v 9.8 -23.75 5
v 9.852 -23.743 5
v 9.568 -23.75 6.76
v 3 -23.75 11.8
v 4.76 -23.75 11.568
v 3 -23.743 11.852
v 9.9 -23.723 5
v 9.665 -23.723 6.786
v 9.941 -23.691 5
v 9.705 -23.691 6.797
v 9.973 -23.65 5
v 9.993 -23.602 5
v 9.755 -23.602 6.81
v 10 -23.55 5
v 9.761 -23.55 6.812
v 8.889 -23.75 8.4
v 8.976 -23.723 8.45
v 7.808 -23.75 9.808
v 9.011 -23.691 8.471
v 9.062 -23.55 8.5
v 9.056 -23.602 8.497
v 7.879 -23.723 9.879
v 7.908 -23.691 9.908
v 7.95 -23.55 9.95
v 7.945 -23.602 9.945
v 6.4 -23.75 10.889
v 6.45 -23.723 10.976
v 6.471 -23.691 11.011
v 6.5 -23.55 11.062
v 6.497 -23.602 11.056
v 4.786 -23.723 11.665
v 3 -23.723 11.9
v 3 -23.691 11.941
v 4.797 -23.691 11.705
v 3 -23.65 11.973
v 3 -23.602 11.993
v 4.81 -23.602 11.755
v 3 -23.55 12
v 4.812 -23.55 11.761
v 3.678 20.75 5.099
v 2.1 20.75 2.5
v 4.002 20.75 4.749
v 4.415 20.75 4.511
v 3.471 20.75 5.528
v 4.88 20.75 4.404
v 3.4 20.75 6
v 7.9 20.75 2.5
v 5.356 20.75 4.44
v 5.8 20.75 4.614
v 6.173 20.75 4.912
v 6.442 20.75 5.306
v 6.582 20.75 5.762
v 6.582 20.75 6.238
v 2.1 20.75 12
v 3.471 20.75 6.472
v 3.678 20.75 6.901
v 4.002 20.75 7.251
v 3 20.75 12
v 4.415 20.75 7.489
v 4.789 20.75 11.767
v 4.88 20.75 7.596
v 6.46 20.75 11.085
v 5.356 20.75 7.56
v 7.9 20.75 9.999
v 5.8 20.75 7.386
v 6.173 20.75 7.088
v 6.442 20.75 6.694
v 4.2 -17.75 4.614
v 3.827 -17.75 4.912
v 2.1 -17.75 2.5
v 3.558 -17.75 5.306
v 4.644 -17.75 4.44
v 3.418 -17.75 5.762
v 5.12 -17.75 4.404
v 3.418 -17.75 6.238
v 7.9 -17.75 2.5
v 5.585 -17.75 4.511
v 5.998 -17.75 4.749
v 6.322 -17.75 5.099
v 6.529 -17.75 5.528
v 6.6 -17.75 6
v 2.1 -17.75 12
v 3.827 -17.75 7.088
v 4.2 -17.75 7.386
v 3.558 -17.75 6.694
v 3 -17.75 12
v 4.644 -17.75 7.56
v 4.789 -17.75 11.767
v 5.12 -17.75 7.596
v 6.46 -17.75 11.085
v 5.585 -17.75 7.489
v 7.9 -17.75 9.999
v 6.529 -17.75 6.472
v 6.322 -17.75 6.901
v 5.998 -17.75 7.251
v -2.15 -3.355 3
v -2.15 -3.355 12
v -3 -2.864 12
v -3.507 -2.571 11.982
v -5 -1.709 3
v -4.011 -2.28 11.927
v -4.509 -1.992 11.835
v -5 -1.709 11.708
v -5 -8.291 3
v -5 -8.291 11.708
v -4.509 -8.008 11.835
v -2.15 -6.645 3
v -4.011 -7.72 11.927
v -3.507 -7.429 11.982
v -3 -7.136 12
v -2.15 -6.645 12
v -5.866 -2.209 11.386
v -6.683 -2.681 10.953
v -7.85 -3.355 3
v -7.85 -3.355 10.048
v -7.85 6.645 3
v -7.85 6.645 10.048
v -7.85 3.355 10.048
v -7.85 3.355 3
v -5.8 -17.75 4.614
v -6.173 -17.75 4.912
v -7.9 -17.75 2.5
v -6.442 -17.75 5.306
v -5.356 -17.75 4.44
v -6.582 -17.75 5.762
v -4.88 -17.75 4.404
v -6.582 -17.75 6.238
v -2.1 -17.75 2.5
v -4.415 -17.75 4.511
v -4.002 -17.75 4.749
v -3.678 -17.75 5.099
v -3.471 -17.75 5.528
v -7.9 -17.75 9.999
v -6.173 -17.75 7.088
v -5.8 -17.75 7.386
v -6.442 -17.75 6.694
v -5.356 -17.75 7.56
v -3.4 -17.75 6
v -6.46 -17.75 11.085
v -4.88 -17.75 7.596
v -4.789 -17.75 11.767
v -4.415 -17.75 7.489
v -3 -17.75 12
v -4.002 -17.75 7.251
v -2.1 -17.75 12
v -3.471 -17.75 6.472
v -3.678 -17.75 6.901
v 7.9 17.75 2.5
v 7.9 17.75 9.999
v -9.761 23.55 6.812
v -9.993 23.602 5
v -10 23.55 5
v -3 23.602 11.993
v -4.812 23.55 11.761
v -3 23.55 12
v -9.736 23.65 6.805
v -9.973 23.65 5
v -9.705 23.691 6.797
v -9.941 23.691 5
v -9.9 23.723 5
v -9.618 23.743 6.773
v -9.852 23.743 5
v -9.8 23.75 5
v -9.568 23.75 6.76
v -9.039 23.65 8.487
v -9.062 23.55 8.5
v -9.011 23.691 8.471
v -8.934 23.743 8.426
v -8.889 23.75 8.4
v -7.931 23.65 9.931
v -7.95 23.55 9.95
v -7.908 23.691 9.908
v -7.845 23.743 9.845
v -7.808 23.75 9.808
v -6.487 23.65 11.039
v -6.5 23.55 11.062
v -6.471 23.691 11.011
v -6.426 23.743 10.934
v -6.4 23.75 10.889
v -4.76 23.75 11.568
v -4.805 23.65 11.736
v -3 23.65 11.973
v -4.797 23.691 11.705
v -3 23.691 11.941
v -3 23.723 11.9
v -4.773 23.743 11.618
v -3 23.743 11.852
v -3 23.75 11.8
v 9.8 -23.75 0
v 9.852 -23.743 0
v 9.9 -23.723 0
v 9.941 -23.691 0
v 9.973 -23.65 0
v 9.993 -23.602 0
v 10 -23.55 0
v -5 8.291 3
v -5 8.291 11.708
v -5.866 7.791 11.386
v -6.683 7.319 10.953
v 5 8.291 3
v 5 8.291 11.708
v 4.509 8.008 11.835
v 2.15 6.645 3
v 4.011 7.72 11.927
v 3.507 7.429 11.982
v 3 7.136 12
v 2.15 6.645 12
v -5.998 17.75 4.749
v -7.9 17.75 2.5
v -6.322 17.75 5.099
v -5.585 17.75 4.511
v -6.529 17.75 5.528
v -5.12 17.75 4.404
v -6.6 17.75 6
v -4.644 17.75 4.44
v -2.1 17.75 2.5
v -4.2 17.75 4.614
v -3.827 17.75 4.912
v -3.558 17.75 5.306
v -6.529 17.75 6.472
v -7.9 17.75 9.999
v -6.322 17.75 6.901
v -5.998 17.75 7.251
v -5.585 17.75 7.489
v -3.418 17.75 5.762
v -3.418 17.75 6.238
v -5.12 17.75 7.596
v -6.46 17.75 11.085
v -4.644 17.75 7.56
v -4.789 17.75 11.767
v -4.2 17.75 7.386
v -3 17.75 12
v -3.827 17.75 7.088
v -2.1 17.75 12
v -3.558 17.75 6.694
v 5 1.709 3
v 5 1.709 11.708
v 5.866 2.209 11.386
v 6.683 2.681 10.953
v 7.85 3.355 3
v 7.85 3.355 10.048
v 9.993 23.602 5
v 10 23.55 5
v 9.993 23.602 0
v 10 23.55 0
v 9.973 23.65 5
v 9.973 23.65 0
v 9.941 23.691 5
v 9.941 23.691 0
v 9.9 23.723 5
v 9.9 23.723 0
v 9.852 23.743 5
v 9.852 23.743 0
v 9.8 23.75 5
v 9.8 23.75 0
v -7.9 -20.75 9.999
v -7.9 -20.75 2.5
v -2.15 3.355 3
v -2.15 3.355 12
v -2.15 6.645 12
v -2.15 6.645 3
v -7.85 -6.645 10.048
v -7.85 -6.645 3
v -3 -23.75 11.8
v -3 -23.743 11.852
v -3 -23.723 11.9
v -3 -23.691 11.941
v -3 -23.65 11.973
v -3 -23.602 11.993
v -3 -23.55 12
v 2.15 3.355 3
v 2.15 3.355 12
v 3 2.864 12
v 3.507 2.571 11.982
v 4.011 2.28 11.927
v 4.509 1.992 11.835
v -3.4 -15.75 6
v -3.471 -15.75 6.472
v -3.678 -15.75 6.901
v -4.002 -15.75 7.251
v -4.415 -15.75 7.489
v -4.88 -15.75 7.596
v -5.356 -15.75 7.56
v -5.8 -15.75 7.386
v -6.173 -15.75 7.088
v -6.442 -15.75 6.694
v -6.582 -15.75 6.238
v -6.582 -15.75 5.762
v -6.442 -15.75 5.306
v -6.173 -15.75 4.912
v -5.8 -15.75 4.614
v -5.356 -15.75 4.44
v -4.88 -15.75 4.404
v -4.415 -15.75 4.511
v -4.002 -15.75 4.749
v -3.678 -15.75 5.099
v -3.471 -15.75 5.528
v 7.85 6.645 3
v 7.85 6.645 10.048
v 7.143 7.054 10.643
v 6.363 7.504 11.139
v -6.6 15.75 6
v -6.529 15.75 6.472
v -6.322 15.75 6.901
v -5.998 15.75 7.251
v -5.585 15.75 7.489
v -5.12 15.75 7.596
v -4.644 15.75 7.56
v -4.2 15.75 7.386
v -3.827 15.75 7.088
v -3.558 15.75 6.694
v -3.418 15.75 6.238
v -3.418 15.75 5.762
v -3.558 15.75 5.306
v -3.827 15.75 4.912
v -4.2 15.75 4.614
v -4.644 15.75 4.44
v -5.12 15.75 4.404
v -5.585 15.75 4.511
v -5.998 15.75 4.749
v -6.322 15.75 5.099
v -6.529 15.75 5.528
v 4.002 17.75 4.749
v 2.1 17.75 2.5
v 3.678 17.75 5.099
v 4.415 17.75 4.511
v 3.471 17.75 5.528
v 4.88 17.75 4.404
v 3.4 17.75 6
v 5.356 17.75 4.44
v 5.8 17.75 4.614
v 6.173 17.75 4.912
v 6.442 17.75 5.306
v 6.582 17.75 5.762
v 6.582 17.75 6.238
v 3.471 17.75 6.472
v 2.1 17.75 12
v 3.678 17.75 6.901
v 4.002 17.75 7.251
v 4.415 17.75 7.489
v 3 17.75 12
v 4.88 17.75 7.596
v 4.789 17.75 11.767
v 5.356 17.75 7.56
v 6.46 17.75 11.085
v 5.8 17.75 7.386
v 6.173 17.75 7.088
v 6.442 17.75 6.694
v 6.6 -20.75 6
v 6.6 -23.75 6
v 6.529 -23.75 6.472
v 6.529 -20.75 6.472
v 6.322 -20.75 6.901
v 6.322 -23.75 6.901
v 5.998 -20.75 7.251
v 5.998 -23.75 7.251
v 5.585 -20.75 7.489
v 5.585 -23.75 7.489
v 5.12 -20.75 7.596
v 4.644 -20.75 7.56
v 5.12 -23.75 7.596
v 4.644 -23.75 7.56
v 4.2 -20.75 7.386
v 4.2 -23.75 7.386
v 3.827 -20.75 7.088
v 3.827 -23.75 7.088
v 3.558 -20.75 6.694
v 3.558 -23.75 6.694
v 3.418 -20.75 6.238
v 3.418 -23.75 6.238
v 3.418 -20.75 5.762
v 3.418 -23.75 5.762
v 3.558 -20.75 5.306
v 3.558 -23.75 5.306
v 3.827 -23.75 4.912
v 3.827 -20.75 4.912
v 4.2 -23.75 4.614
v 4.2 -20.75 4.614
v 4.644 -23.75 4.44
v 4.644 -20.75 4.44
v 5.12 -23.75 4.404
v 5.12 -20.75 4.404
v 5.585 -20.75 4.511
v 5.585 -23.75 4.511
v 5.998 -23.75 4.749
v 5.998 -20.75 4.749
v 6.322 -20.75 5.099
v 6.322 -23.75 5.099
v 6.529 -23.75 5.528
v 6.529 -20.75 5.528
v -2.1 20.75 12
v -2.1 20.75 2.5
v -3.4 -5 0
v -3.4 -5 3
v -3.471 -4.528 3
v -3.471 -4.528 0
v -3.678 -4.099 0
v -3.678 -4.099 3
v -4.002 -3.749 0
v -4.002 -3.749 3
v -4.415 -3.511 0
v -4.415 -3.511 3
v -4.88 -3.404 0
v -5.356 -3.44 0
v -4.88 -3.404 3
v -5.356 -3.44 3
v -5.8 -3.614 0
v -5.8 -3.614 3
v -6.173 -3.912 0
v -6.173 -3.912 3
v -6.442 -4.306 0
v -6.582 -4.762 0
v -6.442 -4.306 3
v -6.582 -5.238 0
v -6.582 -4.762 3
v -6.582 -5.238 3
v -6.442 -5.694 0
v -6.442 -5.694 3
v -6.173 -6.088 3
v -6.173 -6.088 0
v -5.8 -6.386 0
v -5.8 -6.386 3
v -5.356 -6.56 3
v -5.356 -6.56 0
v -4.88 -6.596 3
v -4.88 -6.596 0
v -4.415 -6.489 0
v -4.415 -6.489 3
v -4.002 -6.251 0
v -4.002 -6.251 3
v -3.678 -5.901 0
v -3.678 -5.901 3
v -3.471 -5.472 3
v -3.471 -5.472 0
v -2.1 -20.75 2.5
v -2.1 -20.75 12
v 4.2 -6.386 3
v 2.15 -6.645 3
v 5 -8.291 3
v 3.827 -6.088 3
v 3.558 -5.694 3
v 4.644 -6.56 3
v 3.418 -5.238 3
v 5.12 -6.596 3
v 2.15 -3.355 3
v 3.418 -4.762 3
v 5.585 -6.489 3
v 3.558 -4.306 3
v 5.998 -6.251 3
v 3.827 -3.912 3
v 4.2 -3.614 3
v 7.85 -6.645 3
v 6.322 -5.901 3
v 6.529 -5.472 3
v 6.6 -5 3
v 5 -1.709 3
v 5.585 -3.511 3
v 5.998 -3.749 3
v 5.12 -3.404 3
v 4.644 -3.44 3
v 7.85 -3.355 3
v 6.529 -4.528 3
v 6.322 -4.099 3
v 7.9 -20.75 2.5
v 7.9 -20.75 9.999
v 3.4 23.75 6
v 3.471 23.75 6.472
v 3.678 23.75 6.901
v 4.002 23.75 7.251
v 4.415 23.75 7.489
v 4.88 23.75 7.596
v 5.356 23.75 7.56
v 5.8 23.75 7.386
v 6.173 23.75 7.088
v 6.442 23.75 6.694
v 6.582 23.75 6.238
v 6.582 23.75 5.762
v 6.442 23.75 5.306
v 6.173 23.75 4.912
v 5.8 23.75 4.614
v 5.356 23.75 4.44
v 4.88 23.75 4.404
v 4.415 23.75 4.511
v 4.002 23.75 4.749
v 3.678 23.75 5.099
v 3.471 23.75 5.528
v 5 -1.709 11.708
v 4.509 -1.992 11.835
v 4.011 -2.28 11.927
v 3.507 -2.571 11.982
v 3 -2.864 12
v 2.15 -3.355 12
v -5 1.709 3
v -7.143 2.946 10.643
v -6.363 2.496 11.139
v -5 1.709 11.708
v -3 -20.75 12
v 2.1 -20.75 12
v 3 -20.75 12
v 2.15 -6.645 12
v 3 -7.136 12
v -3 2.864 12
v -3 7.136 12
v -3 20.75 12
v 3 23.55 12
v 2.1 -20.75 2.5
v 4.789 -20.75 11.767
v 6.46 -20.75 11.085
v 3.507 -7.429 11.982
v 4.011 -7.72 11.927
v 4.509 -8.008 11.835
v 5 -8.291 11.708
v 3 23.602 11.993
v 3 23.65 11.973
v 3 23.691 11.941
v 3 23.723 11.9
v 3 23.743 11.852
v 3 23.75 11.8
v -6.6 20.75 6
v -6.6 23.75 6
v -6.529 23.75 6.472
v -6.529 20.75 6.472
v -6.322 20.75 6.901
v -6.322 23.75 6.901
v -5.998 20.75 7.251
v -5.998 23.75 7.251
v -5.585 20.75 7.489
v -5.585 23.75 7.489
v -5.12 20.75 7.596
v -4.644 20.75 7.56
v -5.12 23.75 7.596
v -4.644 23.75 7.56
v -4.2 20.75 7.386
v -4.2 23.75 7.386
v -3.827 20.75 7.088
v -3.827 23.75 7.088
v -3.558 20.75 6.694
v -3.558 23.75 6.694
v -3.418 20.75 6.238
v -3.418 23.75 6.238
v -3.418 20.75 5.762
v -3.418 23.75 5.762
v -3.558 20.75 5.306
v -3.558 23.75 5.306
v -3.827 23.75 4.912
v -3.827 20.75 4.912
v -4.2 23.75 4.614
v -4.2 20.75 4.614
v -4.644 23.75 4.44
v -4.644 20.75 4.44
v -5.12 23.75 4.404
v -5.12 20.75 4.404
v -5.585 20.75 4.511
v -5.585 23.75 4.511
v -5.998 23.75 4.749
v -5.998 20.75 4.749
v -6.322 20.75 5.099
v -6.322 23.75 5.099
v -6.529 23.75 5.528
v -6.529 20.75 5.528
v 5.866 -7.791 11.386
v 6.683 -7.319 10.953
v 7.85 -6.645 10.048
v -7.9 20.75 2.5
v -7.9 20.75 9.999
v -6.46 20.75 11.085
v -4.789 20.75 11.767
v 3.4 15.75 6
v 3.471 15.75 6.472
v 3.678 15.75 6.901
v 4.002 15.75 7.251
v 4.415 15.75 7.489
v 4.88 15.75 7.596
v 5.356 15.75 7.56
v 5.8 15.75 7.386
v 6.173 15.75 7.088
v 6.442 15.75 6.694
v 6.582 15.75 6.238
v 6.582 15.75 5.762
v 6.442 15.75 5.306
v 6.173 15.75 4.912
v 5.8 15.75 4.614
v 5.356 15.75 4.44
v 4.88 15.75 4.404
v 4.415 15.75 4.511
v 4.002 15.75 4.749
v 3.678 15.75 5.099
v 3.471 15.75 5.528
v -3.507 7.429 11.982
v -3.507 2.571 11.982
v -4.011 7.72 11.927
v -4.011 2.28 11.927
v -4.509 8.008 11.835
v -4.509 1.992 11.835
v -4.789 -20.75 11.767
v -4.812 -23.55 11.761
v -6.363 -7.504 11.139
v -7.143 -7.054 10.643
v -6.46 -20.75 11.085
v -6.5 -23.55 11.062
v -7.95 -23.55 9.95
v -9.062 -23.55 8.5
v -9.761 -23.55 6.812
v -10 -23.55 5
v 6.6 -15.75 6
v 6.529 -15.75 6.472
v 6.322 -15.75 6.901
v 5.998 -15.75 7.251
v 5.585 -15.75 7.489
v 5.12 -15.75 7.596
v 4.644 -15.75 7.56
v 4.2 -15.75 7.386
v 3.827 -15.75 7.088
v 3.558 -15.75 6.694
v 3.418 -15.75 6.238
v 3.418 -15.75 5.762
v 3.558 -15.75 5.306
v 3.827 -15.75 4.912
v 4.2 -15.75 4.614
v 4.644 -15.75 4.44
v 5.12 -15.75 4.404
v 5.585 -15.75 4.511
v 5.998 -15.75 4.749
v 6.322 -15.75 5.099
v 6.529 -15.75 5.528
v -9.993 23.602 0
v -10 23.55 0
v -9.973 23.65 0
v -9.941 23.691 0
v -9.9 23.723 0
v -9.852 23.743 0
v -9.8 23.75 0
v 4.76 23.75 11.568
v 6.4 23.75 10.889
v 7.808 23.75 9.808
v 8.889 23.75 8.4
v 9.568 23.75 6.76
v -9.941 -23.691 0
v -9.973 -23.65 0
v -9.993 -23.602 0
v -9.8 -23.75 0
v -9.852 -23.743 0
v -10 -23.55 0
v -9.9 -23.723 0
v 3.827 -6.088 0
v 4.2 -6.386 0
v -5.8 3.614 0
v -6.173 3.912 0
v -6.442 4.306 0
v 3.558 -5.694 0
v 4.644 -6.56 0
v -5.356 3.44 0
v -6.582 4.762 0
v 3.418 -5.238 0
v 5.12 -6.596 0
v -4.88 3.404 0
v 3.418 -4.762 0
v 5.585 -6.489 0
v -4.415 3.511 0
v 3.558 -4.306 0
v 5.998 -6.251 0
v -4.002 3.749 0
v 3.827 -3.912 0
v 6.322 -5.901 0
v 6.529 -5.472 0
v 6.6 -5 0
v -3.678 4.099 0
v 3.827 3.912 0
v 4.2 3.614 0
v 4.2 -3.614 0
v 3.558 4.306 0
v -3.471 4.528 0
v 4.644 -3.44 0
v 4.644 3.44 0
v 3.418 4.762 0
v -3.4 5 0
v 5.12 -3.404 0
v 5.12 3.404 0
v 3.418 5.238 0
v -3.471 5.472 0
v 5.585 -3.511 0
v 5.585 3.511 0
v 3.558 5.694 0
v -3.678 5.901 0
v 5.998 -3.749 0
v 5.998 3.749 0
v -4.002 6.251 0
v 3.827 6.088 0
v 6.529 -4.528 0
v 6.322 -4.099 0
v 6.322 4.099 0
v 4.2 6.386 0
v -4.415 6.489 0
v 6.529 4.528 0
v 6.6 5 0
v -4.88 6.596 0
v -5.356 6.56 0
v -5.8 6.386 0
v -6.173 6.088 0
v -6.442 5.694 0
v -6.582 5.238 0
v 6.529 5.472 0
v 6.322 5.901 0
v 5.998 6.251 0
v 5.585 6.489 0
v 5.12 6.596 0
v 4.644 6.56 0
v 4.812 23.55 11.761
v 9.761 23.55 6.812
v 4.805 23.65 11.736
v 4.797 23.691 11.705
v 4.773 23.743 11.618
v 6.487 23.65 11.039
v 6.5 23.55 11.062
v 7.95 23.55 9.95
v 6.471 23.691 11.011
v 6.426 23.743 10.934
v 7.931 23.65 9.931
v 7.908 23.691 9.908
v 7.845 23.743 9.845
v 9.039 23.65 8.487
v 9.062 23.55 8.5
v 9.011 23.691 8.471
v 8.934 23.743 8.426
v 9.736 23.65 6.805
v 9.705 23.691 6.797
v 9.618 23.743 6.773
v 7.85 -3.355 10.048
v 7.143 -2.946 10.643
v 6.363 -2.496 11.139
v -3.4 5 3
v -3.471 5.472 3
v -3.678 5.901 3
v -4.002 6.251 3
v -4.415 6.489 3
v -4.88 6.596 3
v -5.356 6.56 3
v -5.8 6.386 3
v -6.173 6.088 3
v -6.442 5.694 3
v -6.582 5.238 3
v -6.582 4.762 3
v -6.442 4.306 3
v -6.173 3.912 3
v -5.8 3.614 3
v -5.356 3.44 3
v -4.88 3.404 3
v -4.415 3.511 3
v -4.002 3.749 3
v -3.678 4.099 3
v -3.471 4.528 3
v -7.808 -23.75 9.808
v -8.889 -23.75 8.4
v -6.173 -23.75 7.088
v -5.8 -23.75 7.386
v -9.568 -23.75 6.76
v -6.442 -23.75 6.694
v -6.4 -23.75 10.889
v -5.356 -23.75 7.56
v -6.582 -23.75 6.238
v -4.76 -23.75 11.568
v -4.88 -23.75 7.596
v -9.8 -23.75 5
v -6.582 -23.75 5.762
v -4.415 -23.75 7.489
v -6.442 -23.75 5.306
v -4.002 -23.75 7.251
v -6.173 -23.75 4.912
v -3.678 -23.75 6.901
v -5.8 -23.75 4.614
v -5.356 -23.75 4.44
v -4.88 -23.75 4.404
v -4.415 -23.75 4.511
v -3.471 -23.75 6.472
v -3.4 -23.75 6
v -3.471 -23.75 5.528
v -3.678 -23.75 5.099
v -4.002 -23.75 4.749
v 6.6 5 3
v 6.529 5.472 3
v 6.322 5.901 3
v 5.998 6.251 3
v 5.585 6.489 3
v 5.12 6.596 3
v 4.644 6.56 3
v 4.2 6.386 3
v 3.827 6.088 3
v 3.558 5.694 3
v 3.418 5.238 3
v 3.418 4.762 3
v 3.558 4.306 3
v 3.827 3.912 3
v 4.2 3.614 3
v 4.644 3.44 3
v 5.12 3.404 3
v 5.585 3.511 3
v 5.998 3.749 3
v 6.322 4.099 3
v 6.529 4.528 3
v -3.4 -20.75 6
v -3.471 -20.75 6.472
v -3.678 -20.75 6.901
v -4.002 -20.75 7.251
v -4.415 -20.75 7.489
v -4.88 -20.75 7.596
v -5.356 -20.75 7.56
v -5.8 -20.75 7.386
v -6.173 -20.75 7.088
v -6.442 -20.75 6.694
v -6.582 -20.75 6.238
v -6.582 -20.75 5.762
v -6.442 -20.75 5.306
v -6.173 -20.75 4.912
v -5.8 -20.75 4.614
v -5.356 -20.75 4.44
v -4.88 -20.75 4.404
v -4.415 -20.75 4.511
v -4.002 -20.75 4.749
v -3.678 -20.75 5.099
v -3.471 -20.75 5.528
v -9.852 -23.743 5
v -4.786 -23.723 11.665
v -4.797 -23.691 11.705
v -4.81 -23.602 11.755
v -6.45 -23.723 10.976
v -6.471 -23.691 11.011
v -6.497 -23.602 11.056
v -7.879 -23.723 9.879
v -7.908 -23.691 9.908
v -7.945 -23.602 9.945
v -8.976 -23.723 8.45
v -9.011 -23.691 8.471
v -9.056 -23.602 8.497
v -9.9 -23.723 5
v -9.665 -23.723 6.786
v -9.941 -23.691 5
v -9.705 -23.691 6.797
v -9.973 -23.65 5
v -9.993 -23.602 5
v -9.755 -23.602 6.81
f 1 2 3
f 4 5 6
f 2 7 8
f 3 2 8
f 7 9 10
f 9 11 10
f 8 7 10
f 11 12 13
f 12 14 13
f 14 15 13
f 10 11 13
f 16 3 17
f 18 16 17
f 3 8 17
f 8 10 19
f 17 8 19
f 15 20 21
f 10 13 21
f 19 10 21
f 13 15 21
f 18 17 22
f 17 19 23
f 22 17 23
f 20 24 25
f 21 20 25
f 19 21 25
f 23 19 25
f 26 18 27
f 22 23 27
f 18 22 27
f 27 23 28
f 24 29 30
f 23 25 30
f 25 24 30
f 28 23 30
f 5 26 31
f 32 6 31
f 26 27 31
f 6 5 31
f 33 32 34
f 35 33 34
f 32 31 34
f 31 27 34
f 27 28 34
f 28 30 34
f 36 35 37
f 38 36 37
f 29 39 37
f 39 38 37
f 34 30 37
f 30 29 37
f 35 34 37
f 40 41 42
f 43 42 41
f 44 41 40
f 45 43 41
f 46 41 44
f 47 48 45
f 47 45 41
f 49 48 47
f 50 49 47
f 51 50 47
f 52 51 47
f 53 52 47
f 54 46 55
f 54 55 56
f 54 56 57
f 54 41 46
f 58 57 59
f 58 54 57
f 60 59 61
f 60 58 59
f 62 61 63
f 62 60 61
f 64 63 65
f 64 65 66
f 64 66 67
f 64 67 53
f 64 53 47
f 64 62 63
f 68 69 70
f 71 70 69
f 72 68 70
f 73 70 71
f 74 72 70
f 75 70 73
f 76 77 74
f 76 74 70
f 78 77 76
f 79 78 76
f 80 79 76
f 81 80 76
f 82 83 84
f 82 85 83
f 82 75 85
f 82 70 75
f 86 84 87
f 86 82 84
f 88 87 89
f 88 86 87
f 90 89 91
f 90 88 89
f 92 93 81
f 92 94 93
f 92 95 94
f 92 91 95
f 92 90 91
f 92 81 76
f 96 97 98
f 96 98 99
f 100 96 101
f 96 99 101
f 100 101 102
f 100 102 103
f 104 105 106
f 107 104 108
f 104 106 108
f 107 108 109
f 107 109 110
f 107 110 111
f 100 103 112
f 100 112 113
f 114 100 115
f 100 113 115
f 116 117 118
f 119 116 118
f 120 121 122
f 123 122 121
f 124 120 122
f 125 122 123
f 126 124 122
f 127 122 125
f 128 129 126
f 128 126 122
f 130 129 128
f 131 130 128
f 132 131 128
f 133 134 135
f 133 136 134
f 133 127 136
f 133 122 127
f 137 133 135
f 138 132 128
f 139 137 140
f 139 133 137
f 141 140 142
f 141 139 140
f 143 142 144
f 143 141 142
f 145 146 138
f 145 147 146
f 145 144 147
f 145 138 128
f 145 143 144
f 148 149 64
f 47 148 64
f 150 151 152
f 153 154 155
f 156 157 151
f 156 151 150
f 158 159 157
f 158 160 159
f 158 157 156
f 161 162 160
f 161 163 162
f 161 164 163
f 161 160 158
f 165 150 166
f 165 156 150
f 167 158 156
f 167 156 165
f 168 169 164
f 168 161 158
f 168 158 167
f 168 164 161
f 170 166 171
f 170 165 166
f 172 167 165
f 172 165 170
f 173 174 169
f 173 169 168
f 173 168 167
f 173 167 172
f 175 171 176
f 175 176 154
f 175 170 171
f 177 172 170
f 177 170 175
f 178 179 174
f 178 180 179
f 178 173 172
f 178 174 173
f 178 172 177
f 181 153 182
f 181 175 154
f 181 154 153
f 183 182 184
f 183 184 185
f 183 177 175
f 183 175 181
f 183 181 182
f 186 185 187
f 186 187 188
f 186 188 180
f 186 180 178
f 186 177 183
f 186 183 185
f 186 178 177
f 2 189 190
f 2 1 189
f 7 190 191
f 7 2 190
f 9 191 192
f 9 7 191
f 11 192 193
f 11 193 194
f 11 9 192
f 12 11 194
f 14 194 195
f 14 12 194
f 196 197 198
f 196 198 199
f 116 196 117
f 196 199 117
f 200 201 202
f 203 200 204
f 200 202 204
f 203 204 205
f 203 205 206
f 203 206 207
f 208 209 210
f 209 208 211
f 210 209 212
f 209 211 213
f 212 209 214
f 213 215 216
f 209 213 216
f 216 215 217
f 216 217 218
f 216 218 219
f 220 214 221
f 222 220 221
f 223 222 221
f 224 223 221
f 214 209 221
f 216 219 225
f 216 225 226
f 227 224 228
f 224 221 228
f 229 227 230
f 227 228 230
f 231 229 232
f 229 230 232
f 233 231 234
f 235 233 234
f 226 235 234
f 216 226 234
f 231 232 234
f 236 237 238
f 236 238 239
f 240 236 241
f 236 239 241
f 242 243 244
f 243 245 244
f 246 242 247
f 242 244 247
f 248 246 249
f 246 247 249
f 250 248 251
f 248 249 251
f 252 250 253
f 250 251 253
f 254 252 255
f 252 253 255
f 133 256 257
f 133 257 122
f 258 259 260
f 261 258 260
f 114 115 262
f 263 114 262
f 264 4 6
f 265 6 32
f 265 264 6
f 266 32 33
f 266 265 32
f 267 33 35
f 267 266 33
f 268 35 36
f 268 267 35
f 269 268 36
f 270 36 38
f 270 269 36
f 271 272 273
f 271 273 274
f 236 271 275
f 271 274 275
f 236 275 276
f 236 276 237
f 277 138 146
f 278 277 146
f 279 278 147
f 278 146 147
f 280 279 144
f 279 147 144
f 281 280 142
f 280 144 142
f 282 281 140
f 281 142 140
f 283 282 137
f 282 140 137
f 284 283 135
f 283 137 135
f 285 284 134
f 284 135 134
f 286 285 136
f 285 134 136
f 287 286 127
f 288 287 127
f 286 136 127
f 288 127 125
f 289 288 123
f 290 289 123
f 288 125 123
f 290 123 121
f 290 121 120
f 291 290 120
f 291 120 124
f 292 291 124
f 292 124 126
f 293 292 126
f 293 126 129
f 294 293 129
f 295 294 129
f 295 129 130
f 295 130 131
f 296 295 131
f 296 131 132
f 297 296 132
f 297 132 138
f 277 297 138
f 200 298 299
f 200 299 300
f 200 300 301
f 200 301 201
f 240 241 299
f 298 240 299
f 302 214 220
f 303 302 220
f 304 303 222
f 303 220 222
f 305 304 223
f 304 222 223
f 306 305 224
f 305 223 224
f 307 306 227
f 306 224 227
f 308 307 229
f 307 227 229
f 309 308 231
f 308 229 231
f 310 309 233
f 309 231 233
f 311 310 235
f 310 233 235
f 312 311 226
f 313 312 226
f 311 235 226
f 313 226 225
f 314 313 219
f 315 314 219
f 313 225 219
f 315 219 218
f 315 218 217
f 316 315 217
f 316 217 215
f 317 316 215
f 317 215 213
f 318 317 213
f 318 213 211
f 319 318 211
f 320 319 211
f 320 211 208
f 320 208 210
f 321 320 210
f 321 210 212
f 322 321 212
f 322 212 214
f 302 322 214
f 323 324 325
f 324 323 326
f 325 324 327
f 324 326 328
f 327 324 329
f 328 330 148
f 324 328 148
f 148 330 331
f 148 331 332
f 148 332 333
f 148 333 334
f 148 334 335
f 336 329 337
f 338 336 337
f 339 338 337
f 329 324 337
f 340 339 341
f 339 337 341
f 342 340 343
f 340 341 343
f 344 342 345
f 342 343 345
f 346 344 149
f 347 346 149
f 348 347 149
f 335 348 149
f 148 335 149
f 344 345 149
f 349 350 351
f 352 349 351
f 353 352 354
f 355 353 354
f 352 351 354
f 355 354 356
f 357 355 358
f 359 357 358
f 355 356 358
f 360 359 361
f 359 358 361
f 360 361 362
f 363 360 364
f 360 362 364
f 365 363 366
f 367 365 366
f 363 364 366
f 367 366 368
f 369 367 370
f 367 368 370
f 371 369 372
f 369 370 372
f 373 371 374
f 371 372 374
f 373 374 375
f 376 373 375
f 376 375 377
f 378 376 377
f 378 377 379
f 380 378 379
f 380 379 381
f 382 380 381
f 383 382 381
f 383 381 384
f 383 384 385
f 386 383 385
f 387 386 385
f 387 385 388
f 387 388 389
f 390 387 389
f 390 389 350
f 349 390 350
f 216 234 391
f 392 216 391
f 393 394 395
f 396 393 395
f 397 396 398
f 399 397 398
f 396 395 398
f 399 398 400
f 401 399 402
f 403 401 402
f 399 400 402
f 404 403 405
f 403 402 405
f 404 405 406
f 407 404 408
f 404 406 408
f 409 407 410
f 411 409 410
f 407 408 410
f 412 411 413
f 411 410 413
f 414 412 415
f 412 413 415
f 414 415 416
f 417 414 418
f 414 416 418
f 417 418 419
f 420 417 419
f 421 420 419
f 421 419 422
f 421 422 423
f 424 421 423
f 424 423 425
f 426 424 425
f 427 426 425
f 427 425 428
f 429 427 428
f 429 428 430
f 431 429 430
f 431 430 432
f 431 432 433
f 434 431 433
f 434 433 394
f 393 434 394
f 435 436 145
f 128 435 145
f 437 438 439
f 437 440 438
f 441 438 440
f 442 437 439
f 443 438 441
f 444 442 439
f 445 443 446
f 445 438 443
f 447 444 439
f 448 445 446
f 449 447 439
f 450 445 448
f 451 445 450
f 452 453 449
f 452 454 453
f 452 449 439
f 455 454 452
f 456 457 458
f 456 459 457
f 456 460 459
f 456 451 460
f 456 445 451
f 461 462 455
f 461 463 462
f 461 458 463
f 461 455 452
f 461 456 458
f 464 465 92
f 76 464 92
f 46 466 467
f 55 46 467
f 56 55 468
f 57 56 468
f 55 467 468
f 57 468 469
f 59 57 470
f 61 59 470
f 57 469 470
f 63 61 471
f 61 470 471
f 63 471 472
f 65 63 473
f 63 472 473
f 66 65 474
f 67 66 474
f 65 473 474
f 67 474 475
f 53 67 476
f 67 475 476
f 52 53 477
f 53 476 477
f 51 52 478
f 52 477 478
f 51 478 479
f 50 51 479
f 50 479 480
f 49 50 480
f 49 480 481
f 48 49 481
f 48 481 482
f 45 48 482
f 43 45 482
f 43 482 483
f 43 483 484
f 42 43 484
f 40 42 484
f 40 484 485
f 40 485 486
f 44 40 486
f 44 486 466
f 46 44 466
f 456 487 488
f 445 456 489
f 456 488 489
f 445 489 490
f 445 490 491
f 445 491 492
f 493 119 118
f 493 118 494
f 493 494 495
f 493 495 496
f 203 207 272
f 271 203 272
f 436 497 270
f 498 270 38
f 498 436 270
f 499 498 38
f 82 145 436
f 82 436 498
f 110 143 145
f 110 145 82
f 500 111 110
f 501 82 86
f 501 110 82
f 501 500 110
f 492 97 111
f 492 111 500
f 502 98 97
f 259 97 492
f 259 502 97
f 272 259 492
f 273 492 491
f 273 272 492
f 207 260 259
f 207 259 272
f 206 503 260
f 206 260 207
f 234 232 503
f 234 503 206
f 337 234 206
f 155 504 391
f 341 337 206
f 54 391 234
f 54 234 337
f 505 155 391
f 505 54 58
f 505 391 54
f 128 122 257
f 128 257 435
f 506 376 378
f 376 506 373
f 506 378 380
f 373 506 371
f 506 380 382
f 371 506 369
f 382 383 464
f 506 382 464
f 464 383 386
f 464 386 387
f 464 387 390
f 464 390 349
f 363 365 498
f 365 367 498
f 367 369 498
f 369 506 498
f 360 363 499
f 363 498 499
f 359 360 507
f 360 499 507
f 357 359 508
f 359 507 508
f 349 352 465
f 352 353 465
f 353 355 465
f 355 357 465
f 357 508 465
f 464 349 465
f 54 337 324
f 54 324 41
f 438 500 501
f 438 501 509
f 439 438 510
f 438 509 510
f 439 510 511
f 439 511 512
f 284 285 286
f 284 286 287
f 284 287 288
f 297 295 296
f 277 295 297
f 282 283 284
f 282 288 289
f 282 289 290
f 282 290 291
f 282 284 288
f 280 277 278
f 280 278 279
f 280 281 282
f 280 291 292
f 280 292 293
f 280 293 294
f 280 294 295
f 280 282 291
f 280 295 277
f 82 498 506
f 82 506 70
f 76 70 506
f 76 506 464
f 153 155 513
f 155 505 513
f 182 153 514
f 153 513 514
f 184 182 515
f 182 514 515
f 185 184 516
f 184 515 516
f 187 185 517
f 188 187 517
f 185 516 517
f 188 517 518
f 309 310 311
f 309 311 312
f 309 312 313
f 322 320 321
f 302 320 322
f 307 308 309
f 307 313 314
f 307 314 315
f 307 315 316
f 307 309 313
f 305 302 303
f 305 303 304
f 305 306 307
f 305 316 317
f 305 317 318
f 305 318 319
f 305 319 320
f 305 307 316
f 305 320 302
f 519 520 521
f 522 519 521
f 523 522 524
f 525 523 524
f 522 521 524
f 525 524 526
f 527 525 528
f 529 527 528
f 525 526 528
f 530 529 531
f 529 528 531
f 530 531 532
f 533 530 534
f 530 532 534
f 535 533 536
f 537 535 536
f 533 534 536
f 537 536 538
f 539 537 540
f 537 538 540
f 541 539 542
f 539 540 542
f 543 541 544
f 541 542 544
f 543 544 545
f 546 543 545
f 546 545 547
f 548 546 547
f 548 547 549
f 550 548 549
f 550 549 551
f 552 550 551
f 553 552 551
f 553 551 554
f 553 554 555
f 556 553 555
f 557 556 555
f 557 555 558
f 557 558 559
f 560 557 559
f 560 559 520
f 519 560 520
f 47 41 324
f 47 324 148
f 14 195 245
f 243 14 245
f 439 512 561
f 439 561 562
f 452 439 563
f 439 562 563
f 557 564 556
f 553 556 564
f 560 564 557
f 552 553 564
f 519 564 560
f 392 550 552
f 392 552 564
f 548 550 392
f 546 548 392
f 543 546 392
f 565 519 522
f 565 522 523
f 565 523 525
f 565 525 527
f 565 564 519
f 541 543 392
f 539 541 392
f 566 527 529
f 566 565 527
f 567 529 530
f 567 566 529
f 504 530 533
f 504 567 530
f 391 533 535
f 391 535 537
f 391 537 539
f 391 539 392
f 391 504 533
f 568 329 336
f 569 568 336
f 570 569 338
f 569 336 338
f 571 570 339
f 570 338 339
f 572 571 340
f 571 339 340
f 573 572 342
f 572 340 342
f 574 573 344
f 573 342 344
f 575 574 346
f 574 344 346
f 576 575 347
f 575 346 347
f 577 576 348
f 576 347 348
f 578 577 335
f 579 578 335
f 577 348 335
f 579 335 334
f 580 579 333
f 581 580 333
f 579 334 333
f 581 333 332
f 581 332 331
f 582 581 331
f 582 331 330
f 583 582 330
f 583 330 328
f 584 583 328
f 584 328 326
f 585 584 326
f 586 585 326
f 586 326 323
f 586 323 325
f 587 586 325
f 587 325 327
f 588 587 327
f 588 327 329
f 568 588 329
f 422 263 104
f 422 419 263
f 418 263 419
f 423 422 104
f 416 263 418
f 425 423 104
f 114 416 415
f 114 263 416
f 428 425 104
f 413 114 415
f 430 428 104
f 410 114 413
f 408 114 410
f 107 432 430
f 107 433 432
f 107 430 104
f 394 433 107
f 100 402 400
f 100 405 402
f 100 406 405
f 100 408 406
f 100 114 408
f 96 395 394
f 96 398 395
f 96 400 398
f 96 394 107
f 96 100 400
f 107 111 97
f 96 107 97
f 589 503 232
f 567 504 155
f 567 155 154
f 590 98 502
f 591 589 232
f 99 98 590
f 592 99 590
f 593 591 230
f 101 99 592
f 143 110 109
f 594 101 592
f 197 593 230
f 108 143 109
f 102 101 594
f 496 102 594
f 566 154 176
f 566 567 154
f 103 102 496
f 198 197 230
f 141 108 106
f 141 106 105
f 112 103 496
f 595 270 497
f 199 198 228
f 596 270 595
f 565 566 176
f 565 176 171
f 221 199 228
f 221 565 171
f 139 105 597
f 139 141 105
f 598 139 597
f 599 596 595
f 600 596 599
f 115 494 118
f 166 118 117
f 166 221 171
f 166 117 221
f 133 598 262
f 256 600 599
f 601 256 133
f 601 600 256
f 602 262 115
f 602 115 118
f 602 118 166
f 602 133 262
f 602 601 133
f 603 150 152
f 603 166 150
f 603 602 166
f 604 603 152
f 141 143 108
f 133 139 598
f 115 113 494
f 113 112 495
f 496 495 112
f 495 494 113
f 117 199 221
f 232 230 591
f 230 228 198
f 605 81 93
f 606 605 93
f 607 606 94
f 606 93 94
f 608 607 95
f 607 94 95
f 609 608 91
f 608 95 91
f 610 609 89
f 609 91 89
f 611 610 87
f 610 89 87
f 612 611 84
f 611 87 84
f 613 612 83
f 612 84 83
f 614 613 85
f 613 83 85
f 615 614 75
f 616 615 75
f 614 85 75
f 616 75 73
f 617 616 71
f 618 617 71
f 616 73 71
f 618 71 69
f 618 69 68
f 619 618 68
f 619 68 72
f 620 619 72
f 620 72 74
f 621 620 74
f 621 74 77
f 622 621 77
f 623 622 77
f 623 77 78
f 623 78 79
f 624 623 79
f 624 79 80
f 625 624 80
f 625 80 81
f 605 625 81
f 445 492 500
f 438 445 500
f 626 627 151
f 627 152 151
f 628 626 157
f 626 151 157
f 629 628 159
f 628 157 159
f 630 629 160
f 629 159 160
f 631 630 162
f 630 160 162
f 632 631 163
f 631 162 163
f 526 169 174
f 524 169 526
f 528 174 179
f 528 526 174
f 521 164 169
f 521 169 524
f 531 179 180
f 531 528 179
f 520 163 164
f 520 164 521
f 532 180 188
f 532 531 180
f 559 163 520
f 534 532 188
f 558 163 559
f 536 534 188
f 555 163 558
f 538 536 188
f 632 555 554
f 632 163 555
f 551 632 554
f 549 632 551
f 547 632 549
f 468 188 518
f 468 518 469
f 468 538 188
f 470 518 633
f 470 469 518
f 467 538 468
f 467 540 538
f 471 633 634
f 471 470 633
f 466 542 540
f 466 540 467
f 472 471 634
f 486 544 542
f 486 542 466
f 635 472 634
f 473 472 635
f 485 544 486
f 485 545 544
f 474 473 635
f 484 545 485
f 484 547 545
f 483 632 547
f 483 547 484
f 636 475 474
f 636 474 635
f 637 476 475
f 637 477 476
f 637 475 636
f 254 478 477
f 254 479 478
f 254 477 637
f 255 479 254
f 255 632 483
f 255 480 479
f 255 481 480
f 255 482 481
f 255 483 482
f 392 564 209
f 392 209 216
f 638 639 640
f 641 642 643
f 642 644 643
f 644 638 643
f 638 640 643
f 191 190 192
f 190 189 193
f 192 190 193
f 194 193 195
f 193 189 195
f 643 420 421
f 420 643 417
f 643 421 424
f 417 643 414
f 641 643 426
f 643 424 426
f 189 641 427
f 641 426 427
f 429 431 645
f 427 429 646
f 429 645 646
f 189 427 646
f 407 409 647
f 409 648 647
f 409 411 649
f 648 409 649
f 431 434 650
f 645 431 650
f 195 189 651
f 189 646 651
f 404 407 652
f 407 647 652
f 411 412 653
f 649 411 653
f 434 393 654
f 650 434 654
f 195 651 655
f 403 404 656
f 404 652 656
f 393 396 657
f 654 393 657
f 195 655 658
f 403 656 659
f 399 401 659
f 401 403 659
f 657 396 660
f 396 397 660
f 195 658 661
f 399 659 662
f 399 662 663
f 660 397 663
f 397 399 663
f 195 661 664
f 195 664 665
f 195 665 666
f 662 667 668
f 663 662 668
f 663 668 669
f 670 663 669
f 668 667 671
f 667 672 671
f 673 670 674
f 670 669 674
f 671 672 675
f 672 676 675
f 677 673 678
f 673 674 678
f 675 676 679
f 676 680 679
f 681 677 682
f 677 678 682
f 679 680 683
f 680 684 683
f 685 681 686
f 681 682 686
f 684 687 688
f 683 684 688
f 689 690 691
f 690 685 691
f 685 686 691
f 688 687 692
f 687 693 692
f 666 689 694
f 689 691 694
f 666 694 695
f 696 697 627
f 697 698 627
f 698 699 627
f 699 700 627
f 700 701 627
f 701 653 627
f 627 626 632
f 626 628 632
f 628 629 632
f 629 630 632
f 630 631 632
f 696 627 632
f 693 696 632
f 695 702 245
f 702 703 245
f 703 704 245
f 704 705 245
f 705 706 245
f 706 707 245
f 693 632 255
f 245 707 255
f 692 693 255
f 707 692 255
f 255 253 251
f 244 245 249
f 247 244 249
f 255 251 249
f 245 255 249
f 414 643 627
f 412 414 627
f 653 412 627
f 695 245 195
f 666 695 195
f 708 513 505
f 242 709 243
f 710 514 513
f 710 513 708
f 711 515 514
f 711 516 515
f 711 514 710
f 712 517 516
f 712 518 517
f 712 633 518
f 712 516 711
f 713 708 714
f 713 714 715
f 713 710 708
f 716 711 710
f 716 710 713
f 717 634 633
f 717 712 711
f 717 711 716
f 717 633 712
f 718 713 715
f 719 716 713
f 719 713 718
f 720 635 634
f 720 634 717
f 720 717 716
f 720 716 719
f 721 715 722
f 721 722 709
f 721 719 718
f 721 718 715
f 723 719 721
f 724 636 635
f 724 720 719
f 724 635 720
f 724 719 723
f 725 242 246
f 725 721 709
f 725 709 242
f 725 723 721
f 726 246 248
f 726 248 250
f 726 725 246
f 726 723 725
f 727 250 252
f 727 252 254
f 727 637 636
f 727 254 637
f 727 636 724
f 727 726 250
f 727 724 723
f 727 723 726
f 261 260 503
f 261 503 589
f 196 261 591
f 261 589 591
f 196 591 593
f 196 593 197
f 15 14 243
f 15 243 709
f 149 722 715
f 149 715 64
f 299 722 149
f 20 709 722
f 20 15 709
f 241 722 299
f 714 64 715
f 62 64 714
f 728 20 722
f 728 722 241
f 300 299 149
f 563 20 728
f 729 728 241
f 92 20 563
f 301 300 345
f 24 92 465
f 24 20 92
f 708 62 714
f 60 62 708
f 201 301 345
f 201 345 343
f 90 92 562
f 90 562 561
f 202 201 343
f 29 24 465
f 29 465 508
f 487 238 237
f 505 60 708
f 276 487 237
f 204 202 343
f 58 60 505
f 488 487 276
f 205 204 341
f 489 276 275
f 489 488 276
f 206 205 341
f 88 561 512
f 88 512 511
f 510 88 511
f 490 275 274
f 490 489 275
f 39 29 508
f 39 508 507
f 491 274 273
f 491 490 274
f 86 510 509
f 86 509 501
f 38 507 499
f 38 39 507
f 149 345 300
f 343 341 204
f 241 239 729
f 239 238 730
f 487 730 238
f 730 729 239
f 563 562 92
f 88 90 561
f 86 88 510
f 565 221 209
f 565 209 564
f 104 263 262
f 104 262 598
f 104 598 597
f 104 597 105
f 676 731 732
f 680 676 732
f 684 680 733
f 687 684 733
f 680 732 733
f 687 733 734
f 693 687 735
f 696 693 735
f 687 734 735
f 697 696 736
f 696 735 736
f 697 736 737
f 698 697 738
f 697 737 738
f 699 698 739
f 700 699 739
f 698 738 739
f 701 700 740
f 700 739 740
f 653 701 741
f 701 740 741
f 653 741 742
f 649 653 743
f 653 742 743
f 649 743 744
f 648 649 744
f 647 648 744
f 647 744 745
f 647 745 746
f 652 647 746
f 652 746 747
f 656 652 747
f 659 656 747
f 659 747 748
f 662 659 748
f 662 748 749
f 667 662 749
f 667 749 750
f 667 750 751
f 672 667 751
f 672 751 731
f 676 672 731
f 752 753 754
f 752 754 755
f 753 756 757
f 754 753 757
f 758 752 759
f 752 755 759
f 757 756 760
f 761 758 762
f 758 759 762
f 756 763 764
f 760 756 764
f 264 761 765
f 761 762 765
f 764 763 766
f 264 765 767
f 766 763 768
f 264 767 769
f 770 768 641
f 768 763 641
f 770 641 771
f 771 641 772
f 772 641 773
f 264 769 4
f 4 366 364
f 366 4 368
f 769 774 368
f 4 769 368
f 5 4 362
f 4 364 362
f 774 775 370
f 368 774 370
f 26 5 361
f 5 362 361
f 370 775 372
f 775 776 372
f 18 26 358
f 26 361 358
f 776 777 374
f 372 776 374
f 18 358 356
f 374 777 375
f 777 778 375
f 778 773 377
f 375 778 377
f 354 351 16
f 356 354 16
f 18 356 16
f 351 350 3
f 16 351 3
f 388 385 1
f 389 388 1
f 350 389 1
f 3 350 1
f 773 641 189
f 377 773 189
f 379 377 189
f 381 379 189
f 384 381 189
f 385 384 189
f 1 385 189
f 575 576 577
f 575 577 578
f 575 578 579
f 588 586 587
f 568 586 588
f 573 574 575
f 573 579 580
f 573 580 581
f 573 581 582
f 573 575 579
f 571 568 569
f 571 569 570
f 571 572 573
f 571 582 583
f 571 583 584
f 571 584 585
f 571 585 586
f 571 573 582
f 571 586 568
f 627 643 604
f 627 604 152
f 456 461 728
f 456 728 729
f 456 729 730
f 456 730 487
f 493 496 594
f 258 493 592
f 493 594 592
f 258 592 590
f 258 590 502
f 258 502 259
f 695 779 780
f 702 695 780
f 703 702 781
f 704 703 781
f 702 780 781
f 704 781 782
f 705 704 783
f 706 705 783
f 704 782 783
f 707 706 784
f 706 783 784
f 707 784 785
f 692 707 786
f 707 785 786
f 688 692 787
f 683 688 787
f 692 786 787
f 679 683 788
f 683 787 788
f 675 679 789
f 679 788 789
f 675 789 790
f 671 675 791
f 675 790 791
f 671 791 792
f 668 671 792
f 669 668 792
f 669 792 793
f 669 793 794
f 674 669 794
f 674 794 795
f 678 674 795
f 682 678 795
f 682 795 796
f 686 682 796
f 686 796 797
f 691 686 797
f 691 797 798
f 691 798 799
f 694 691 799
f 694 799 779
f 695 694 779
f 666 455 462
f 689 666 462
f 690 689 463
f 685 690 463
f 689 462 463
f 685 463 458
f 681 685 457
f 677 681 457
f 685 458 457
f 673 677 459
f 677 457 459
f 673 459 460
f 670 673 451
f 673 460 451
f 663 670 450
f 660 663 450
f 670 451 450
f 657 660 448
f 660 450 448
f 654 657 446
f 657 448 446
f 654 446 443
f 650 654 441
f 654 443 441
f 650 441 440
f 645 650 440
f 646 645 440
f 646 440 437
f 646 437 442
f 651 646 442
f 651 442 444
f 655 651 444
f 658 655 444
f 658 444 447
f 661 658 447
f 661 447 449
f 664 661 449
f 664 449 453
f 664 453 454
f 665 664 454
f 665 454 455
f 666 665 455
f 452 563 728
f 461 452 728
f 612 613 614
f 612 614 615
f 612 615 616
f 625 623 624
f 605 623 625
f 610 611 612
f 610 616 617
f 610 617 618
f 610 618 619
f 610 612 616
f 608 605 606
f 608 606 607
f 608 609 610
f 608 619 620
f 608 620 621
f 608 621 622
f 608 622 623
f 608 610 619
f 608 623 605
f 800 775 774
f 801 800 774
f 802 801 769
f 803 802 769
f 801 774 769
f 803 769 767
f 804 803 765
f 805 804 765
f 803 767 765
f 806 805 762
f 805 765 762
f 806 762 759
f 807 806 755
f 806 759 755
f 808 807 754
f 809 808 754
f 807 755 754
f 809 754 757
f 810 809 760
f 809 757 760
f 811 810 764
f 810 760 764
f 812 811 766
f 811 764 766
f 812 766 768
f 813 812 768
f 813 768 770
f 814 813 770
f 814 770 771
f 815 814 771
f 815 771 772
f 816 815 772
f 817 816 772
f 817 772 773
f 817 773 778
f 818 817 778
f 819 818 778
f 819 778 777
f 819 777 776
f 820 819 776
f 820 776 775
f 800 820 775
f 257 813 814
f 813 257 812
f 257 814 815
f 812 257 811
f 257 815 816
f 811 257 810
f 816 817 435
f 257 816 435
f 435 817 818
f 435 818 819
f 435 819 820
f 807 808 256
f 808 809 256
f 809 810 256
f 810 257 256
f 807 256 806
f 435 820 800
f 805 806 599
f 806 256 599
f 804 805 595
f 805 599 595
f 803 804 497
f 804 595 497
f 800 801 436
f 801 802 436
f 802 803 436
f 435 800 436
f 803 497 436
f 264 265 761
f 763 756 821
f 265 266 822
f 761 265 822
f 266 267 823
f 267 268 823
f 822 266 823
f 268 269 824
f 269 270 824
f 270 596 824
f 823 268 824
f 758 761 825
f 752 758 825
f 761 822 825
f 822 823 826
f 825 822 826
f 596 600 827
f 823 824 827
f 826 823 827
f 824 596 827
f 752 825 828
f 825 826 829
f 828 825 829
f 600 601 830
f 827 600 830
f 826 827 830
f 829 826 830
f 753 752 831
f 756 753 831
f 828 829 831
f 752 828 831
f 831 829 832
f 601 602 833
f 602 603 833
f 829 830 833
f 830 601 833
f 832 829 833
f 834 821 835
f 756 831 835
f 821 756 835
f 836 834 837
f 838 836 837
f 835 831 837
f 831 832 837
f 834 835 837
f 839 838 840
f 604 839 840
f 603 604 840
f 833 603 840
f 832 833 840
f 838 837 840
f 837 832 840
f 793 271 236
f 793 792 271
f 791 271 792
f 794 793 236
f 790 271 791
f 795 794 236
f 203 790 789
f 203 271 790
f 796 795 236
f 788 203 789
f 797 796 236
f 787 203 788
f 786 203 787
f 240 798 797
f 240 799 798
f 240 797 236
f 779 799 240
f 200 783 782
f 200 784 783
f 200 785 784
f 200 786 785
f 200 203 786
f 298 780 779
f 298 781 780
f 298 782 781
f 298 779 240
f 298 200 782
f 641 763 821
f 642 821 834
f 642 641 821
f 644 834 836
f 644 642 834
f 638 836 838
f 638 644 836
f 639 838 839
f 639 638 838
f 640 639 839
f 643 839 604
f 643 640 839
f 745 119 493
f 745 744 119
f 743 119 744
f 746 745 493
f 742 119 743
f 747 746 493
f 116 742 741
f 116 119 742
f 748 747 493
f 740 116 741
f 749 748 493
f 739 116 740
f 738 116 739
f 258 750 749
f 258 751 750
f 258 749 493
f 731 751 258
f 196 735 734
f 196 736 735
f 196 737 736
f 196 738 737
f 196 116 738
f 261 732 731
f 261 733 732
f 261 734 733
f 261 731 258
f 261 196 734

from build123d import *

# Parameters (mm, degrees)
SKETCH_W        = 20
SKETCH_H        = 47.5
PAD_DEPTH       = 12
SKETCH001_R     = 1.6
POCKET_DEPTH    = 8
SKETCH002_R     = 1.6
POCKET001_DEPTH = 8
SKETCH003_W     = 5.8
SKETCH003_H     = 3
POCKET002_DEPTH = 9.5
SKETCH004_R     = 1.6
POCKET003_DEPTH = 12
POCKET004_DEPTH = 9
POCKET005_DEPTH = 50
FILLET_R        = 0.2


with BuildPart() as part:
    # Sketch → Pad (new body)
    with BuildSketch(Plane.XY):
        Rectangle(SKETCH_W, SKETCH_H)
    extrude(amount=PAD_DEPTH)

    # Sketch001 (on Face3 of Pad) → Pocket (cut)
    with BuildSketch(Plane.XZ.offset(23.75)):
        with Locations((-5, 6)):
            Circle(SKETCH001_R)
        with Locations((5, 6)):
            Circle(SKETCH001_R)
    extrude(amount=-POCKET_DEPTH, mode=Mode.SUBTRACT)

    # Sketch002 (on Face1 of Pocket) → Pocket001 (cut)
    with BuildSketch(Plane(origin=(0, 23.75, 0), x_dir=(-1, 0, 0), z_dir=(0, 1, 0))):
        with Locations((-5, 6)):
            Circle(SKETCH002_R)
        with Locations((5, 6)):
            Circle(SKETCH002_R)
    extrude(amount=-POCKET001_DEPTH, mode=Mode.SUBTRACT)

    # Sketch003 (on Face4 of Pocket001) → Pocket002 (cut)
    with BuildSketch(Plane.XY.offset(12)):
        with Locations((-5, 19.25)):
            Rectangle(SKETCH003_W, SKETCH003_H)
        with Locations((5, 19.25)):
            Rectangle(SKETCH003_W, SKETCH003_H)
        with Locations((-5, -19.25)):
            Rectangle(SKETCH003_W, SKETCH003_H)
        with Locations((5, -19.25)):
            Rectangle(SKETCH003_W, SKETCH003_H)
    extrude(amount=-POCKET002_DEPTH, mode=Mode.SUBTRACT)

    # Sketch004 (on Face4 of Pocket002) → Pocket003 (cut)
    with BuildSketch(Plane.XY.offset(12)):
        with Locations((-5, 5)):
            Circle(SKETCH004_R)
        with Locations((5, 5)):
            Circle(SKETCH004_R)
        with Locations((-5, -5)):
            Circle(SKETCH004_R)
        with Locations((5, -5)):
            Circle(SKETCH004_R)
    extrude(amount=-POCKET003_DEPTH, mode=Mode.SUBTRACT)

    # Sketch005 (on Face4 of Pocket003) → Pocket004 (cut)
    with BuildSketch(Plane.XY.offset(12)):
        Polygon((-5, 8.290897), (-7.85, 6.645448), (-7.85, 3.354552), (-5, 1.709103), (-2.15, 3.354552), (-2.15, 6.645448), align=None)
        Polygon((7.85, 6.645448), (5, 8.290897), (2.15, 6.645448), (2.15, 3.354552), (5, 1.709103), (7.85, 3.354552), align=None)
        Polygon((-5, -1.709103), (-7.85, -3.354552), (-7.85, -6.645448), (-5, -8.290897), (-2.15, -6.645448), (-2.15, -3.354552), align=None)
        Polygon((7.85, -3.354552), (5, -1.709103), (2.15, -3.354552), (2.15, -6.645448), (5, -8.290897), (7.85, -6.645448), align=None)
    extrude(amount=-POCKET004_DEPTH, mode=Mode.SUBTRACT)

    # Sketch008 (on Face8 of Pocket004) → Pocket005 (cut)
    with BuildSketch(Plane.XZ.offset(23.75)):
        with BuildLine():
            ThreePointArc((-3, 12), (-7.949747, 9.949747), (-10, 5))
            Line((-10, 5), (-10, 13))
            Line((10, 13), (-10, 13))
            Line((10, 5), (10, 13))
            ThreePointArc((10, 5), (7.949747, 9.949747), (3, 12))
            Line((-3, 12), (3, 12))
        make_face()
    extrude(amount=-POCKET005_DEPTH, mode=Mode.SUBTRACT)

    # Fillet
    fillet_edges = [part.edges().sort_by_distance(p)[0] for p in [
        (10, -23.75, 2.5),
        (-10, -23.75, 2.5),
        (-10, 23.75, 2.5),
        (10, 23.75, 2.5),
    ]]
    fillet(fillet_edges, radius=FILLET_R)


solid = part.part
